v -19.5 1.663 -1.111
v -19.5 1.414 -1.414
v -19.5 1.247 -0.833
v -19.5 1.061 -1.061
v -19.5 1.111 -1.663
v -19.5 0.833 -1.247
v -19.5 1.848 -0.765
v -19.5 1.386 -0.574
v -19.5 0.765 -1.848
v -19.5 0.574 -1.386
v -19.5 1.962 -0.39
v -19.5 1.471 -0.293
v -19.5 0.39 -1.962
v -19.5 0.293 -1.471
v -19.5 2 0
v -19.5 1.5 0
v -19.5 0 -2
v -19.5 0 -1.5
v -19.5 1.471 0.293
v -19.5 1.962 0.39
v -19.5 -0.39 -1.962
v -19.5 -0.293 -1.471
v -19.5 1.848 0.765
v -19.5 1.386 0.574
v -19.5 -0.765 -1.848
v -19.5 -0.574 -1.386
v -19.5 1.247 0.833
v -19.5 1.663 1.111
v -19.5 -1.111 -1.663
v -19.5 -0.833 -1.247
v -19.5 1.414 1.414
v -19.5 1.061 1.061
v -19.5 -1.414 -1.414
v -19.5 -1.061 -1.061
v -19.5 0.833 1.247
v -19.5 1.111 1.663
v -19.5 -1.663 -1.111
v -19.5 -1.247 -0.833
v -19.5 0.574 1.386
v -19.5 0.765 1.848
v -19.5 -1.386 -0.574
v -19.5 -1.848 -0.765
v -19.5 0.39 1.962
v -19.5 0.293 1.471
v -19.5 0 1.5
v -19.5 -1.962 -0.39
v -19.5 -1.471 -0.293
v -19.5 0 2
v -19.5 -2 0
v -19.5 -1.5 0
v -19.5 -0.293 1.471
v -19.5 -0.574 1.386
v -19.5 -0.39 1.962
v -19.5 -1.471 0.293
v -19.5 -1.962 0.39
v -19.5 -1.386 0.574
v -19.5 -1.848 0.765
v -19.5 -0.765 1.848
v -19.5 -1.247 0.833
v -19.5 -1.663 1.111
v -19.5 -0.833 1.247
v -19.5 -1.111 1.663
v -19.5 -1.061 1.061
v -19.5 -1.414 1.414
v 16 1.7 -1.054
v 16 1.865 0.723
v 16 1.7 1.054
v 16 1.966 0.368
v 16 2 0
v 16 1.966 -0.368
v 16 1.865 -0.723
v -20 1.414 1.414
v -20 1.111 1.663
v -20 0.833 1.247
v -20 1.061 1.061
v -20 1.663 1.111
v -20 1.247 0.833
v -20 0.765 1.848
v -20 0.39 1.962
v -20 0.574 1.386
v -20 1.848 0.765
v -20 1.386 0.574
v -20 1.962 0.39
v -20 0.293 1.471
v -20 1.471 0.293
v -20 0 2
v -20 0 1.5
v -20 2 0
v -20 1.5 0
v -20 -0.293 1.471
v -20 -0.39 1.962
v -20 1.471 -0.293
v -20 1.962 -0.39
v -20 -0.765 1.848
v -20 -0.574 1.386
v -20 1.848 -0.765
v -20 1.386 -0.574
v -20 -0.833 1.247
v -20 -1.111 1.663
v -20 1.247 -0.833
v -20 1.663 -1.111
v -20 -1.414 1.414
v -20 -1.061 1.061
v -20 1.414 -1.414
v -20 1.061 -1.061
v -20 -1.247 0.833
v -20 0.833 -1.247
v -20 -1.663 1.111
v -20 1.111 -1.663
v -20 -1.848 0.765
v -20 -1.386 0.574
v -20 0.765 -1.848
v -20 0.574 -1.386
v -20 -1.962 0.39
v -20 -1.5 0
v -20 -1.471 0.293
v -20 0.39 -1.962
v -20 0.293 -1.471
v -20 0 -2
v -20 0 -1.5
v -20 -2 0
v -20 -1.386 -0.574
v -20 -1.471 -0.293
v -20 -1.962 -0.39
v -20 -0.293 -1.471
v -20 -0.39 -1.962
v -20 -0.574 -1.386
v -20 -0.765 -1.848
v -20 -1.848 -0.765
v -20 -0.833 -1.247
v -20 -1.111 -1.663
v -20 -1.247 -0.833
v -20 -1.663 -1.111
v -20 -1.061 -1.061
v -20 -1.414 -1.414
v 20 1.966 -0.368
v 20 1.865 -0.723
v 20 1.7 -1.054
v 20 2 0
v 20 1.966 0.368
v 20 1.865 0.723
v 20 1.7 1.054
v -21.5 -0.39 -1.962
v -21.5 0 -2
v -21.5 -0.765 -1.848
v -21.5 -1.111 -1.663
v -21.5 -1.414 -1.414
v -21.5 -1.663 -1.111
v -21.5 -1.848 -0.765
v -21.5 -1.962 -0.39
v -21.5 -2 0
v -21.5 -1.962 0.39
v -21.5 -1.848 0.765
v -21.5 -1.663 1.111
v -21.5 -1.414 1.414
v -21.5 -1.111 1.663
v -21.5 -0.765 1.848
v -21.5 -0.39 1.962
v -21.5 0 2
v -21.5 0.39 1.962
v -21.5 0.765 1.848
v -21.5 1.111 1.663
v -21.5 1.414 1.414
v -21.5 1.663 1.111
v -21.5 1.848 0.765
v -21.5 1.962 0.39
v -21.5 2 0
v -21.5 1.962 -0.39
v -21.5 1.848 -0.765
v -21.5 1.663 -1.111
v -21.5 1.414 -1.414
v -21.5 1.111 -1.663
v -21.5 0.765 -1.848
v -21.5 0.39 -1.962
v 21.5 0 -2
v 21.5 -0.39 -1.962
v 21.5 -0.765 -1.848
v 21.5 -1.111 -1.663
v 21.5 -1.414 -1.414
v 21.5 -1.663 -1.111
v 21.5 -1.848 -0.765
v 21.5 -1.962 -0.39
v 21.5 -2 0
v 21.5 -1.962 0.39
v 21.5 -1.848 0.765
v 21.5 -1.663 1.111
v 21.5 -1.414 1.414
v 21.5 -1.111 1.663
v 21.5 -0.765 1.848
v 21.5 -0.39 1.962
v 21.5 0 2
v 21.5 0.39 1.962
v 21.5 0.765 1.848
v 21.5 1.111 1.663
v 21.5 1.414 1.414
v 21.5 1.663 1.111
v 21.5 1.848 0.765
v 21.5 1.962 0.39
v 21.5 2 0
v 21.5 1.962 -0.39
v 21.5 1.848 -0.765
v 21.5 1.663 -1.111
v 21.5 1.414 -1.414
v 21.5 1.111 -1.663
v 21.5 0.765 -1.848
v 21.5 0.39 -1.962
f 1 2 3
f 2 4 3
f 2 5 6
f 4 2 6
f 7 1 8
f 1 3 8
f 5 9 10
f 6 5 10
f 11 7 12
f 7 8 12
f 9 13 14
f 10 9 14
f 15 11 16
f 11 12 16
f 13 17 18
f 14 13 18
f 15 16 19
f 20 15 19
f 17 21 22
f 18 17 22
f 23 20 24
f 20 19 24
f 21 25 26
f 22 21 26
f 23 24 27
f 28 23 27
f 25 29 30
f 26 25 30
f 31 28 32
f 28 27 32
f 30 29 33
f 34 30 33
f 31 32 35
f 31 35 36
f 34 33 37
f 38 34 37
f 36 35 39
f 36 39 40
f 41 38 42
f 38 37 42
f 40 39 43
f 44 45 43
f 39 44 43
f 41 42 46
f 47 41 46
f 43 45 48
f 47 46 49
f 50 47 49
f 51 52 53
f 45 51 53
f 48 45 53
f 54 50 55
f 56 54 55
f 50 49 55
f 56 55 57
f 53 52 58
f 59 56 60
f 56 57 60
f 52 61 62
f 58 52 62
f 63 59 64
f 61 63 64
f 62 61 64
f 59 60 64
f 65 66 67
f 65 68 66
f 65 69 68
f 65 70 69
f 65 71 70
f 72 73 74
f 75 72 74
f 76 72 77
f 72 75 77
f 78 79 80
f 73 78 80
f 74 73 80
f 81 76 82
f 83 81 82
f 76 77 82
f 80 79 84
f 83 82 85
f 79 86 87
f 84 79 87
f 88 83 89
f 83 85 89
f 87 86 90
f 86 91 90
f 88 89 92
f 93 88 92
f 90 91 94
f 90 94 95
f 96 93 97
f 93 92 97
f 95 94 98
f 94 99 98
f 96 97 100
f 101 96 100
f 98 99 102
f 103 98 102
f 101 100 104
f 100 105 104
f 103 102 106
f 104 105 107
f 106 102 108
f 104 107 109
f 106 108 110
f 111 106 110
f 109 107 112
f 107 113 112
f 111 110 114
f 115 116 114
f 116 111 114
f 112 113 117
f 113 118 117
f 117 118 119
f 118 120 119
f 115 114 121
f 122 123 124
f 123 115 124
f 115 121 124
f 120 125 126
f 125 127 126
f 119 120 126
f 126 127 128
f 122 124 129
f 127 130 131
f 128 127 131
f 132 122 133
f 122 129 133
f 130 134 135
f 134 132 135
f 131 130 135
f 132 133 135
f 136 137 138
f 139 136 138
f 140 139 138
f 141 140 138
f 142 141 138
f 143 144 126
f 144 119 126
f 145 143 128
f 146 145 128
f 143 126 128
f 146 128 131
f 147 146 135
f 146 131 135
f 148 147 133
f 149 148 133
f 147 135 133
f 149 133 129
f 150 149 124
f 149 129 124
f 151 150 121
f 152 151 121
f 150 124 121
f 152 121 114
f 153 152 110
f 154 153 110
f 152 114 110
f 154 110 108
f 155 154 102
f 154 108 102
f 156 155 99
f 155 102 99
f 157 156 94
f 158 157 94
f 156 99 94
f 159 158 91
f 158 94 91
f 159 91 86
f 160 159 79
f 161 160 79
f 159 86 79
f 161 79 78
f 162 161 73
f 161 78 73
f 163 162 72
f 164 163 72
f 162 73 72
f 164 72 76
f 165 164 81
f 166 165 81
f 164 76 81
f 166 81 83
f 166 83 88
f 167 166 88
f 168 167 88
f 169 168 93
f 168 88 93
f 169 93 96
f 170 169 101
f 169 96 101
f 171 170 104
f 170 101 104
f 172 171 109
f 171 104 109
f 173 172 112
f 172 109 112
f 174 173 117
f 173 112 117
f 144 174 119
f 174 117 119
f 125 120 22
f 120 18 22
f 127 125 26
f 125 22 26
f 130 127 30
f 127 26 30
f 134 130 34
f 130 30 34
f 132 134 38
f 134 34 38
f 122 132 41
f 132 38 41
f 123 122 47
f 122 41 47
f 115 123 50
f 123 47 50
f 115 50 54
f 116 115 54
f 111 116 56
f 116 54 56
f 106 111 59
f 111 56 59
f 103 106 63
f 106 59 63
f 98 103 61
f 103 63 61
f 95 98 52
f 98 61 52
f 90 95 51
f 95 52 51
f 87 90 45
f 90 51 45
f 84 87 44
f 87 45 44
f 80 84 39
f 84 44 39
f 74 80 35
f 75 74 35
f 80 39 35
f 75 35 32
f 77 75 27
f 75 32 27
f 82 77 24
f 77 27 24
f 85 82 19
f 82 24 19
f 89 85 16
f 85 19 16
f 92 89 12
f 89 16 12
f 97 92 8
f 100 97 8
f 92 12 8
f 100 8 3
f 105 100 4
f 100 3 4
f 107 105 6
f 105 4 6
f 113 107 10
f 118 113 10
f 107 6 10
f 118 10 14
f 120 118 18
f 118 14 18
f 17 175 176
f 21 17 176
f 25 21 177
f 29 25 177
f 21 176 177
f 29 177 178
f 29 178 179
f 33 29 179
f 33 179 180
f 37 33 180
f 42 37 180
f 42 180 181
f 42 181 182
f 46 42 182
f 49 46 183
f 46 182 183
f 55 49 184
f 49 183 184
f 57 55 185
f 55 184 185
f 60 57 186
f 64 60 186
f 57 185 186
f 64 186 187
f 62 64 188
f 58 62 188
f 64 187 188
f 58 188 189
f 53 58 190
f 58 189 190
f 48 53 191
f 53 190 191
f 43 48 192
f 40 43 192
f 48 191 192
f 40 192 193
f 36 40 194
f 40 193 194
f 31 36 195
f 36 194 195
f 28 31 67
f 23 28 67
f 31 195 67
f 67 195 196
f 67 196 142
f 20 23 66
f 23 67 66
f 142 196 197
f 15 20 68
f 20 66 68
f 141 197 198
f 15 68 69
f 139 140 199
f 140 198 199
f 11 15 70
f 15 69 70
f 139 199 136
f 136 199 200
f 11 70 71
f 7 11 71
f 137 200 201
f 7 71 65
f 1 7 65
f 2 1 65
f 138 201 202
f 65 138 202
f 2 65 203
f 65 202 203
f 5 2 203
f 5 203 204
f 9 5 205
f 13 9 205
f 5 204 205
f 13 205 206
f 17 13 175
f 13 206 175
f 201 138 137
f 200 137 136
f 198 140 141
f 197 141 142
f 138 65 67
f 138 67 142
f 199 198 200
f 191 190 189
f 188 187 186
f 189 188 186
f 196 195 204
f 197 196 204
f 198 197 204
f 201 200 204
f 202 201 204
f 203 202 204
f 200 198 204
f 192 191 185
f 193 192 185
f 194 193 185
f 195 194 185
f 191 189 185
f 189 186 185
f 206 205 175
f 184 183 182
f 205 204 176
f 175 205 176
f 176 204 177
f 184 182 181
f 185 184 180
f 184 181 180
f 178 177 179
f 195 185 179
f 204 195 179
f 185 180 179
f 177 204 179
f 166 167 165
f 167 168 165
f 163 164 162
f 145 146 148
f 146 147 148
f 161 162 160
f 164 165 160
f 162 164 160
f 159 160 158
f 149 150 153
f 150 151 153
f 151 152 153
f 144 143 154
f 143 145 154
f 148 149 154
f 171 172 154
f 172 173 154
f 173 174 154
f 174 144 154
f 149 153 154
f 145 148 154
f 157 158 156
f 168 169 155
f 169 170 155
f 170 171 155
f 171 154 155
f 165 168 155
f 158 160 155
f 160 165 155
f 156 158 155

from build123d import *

# Parameters (mm, degrees)
CUT_EXTRUDE1_START = 2
SKETCH2_W          = 4
SKETCH2_H          = 4
CUT_EXTRUDE1_DEPTH = 0.3


with BuildPart() as part:
    # Sketch1 → Revolve1 (revolve)
    with BuildSketch(Plane.XY, mode=Mode.PRIVATE) as revolve1_sk:
        Polygon((21.5, 0), (-21.5, 0), (-21.5, 2), (-20, 2), (-20, 1.5), (-19.5, 1.5), (-19.5, 2), (21.5, 2), align=None)
    revolve(revolve1_sk.sketch.rotate(Axis((-21.5, 0, 0), (-1, 0, 0)), 90), axis=Axis((-21.5, 0, 0), (-1, 0, 0)))

    # Sketch2 → Cut-Extrude1 (cut)
    with BuildSketch(Plane(origin=(0, 0, 0), x_dir=(1, 0, 0), z_dir=(0, 1, 0)).offset(CUT_EXTRUDE1_START)):
        with Locations((18, 0)):
            Rectangle(SKETCH2_W, SKETCH2_H)
    extrude(amount=-CUT_EXTRUDE1_DEPTH, mode=Mode.SUBTRACT)


solid = part.part
